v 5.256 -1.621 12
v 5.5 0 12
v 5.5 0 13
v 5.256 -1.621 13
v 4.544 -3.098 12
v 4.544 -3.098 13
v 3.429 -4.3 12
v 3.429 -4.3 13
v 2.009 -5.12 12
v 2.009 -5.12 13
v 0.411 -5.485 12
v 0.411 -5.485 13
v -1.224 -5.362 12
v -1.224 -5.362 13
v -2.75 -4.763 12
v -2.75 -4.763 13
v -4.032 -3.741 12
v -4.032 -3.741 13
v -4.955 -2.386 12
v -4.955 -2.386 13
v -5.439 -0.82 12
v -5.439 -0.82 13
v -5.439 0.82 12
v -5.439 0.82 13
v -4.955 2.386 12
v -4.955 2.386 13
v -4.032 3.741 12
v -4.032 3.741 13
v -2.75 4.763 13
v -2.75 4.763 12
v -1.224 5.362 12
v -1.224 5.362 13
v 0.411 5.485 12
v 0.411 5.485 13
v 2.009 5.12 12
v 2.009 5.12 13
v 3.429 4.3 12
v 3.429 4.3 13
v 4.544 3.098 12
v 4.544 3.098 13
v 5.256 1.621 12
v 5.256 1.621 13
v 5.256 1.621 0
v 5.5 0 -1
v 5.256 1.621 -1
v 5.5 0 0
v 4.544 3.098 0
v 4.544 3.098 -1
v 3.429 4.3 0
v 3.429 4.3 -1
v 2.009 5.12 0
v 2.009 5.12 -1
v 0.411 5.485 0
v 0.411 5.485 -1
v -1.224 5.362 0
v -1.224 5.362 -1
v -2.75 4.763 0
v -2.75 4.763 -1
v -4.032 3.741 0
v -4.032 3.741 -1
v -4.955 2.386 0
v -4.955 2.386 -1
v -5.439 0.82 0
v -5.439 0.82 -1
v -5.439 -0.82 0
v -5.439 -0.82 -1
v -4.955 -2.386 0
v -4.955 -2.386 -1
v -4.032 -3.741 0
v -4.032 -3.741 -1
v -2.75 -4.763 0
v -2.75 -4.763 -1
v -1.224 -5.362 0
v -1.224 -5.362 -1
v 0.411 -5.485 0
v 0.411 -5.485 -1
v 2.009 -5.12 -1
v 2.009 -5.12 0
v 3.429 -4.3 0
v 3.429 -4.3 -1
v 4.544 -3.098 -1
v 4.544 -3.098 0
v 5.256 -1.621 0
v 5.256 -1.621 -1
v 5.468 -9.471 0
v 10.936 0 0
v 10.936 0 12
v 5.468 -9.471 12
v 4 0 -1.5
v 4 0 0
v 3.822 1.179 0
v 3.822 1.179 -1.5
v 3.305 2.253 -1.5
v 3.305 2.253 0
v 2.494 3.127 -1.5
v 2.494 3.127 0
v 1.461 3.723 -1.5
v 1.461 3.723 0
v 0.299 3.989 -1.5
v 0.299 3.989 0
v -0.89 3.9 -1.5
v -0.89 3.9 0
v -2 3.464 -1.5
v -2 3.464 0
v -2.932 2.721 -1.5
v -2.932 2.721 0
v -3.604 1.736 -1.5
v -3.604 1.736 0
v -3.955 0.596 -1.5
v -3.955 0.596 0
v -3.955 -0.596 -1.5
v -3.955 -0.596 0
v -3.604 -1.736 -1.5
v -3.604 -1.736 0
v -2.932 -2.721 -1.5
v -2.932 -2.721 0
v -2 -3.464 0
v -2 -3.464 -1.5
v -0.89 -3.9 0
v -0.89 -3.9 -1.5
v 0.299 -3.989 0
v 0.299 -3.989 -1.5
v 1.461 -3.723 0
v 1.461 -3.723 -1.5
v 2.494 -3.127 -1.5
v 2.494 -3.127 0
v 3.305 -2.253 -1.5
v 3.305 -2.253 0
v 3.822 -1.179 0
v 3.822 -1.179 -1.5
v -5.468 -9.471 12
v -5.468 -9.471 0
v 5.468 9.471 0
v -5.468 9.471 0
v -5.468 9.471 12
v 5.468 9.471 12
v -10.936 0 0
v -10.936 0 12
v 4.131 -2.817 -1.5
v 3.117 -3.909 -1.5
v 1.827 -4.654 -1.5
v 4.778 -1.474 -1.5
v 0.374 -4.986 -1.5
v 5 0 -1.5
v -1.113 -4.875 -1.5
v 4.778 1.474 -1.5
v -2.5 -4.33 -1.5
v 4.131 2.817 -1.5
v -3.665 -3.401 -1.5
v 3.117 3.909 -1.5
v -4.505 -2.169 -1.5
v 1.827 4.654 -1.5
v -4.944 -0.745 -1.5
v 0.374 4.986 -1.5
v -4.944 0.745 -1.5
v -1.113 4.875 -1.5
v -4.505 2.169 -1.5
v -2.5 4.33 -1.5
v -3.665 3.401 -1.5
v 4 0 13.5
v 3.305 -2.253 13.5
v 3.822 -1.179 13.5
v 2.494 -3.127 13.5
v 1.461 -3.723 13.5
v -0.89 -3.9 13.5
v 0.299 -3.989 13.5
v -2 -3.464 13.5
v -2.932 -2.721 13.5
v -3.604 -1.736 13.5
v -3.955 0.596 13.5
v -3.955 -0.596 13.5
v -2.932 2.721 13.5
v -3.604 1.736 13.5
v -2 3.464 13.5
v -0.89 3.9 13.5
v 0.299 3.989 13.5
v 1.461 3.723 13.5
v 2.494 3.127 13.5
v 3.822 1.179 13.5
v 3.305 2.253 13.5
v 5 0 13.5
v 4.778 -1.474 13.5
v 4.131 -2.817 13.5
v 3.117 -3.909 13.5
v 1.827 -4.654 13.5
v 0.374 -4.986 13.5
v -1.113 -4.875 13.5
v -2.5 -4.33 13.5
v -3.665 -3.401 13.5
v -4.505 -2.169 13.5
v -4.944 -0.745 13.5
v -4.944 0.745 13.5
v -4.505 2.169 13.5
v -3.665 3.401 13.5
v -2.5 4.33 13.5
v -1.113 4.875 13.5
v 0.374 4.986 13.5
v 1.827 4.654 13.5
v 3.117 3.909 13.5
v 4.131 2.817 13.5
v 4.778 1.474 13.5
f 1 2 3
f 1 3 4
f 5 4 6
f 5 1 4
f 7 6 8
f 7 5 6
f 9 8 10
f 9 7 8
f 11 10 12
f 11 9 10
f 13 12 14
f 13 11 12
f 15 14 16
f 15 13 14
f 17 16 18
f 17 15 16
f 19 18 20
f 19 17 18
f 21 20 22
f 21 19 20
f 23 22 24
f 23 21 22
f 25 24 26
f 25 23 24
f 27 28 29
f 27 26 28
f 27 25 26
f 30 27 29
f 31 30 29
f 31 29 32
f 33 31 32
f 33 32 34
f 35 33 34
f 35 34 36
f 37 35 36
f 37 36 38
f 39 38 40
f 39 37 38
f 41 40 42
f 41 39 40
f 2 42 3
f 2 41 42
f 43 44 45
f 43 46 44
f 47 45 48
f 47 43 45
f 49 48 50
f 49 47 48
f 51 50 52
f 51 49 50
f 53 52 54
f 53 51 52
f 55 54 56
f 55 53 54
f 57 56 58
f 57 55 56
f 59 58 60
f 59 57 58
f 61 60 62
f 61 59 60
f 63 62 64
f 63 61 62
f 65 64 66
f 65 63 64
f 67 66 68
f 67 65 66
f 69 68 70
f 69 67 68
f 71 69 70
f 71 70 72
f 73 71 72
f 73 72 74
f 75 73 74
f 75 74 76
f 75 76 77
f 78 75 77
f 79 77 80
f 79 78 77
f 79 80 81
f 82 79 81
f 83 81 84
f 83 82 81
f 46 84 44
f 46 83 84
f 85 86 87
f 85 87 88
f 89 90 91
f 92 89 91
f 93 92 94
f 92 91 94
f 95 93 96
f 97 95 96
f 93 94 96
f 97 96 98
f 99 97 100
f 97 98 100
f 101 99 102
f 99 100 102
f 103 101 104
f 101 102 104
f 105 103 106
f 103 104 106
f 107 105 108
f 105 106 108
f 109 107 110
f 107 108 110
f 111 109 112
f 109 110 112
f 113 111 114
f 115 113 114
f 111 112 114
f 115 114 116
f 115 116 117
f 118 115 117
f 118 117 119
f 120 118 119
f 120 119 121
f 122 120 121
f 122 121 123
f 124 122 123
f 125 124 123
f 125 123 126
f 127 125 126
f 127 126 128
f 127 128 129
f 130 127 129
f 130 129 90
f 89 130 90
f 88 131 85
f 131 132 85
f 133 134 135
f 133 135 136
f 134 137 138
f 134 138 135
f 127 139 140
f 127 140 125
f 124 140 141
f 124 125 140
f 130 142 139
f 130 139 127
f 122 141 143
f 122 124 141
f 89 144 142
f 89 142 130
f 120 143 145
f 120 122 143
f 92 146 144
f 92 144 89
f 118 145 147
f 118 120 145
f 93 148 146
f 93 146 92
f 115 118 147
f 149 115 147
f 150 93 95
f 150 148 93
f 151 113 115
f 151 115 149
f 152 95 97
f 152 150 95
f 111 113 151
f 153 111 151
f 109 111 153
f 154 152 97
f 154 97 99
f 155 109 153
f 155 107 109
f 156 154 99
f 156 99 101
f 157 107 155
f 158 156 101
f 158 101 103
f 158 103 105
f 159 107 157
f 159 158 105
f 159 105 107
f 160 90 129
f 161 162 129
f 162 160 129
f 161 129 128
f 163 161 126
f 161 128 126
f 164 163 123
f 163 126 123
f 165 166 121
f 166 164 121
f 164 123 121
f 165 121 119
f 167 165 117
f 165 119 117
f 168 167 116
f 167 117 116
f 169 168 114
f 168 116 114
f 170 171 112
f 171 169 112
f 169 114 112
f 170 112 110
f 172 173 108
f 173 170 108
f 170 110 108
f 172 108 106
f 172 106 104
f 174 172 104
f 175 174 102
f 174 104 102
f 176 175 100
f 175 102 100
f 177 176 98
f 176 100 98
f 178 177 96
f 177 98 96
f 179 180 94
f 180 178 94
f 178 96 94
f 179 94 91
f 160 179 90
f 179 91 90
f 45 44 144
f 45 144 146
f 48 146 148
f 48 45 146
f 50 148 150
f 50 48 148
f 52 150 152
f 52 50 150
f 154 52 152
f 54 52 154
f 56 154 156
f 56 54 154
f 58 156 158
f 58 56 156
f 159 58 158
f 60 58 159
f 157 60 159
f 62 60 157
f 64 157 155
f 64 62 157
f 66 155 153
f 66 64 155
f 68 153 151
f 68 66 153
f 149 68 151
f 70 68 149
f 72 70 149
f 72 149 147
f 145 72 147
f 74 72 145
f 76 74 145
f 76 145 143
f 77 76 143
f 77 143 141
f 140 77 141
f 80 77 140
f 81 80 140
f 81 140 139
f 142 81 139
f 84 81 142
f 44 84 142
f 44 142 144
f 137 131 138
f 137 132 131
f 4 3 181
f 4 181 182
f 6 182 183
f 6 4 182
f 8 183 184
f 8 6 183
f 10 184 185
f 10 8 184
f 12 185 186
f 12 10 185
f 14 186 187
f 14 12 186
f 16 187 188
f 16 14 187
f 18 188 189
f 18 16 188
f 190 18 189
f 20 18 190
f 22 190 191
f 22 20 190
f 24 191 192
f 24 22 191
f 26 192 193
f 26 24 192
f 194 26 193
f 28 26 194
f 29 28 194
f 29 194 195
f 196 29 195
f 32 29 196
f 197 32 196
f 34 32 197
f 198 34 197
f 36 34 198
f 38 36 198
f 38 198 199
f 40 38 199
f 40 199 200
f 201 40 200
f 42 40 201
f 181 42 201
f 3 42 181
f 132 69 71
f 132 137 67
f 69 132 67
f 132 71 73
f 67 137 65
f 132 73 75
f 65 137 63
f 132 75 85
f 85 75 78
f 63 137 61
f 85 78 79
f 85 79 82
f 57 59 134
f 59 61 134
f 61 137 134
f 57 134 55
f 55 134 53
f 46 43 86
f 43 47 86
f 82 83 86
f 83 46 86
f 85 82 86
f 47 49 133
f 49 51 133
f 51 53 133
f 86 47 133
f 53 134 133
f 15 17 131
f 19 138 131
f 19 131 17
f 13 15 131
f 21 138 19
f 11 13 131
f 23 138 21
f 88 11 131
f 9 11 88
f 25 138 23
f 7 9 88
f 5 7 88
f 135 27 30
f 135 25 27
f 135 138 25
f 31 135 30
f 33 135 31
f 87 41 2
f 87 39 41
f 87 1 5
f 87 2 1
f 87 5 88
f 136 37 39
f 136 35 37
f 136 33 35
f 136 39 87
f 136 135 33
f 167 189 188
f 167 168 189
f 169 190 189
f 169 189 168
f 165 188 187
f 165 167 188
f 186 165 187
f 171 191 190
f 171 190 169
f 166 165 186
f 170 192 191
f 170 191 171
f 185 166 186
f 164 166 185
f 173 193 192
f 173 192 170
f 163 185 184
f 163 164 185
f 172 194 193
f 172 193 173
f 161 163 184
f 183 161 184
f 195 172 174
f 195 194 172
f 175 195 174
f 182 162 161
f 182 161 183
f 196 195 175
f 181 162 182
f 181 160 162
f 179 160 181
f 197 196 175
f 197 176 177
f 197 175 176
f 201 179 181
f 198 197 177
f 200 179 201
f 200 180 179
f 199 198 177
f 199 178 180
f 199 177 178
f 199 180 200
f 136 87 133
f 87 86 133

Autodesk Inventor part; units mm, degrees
ref_plane "YZ Plane" through (0, 0, 0) normal (1, 0, 0) x (0, 1, 0)
ref_plane "XZ Plane" through (0, 0, 0) normal (0, 1, 0) x (-1, 0, 0)
sketch "Эскиз1" plane through (0, 0, 0) normal (0, 0, 1) x (1, 0, 0)
  circle A0 centre (0, 0) radius 4
  line L0 (10.9362, 0) -> (5.4681, 9.471)
  line L1 (-5.4681, 9.471) -> (5.4681, 9.471)
  line L2 (-10.9362, 0) -> (-5.4681, 9.471)
  line L3 (-5.4681, -9.471) -> (5.4681, -9.471)
  line L4 (-5.4681, -9.471) -> (-10.9362, 0)
  line L5 (10.9362, 0) -> (5.4681, -9.471)
  line L6 (0, 0) -> (10.9362, 0)
  dimension "d45" = 8
  dimension "d52" = 120
  dimension "d53" = 120
  dimension "d54" = 10.9362
  dimension "d55" = 9.471
extrude "Выдавливание1" add sketch "Эскиз1" along normal blind 12
sketch "Эскиз3" plane through (0, 0, 12) normal (0, 0, 1) x (1, 0, 0)
  circle A0 centre (0, 0) radius 4
  circle A1 centre (0, 0) radius 5.5
  dimension "d56" = 8
  dimension "d57" = 11
extrude "Выдавливание3" add sketch "Эскиз3" along normal blind 1.5
chamfer "Фаска2" distance 0.5 angle 45 1 edges at (-5.5, 0, 13.5)
ref_plane "РабПлоскость1" through (0, 0, 6) normal (0, 0, 1) x (1, 0, 0)
mirror "Зеркальное отражение1" about plane through (0, 0, 6) normal (0, 0, 1) of "Выдавливание3"
chamfer "Фаска3" distance 0.5 angle 45 1 edges at (-5.5, 0, -1.5)
thread "Резьба1" size "M8x1.25" class "6H" standard "ANSI Metric M Profile" full length
properties part number "Нагаечник"
